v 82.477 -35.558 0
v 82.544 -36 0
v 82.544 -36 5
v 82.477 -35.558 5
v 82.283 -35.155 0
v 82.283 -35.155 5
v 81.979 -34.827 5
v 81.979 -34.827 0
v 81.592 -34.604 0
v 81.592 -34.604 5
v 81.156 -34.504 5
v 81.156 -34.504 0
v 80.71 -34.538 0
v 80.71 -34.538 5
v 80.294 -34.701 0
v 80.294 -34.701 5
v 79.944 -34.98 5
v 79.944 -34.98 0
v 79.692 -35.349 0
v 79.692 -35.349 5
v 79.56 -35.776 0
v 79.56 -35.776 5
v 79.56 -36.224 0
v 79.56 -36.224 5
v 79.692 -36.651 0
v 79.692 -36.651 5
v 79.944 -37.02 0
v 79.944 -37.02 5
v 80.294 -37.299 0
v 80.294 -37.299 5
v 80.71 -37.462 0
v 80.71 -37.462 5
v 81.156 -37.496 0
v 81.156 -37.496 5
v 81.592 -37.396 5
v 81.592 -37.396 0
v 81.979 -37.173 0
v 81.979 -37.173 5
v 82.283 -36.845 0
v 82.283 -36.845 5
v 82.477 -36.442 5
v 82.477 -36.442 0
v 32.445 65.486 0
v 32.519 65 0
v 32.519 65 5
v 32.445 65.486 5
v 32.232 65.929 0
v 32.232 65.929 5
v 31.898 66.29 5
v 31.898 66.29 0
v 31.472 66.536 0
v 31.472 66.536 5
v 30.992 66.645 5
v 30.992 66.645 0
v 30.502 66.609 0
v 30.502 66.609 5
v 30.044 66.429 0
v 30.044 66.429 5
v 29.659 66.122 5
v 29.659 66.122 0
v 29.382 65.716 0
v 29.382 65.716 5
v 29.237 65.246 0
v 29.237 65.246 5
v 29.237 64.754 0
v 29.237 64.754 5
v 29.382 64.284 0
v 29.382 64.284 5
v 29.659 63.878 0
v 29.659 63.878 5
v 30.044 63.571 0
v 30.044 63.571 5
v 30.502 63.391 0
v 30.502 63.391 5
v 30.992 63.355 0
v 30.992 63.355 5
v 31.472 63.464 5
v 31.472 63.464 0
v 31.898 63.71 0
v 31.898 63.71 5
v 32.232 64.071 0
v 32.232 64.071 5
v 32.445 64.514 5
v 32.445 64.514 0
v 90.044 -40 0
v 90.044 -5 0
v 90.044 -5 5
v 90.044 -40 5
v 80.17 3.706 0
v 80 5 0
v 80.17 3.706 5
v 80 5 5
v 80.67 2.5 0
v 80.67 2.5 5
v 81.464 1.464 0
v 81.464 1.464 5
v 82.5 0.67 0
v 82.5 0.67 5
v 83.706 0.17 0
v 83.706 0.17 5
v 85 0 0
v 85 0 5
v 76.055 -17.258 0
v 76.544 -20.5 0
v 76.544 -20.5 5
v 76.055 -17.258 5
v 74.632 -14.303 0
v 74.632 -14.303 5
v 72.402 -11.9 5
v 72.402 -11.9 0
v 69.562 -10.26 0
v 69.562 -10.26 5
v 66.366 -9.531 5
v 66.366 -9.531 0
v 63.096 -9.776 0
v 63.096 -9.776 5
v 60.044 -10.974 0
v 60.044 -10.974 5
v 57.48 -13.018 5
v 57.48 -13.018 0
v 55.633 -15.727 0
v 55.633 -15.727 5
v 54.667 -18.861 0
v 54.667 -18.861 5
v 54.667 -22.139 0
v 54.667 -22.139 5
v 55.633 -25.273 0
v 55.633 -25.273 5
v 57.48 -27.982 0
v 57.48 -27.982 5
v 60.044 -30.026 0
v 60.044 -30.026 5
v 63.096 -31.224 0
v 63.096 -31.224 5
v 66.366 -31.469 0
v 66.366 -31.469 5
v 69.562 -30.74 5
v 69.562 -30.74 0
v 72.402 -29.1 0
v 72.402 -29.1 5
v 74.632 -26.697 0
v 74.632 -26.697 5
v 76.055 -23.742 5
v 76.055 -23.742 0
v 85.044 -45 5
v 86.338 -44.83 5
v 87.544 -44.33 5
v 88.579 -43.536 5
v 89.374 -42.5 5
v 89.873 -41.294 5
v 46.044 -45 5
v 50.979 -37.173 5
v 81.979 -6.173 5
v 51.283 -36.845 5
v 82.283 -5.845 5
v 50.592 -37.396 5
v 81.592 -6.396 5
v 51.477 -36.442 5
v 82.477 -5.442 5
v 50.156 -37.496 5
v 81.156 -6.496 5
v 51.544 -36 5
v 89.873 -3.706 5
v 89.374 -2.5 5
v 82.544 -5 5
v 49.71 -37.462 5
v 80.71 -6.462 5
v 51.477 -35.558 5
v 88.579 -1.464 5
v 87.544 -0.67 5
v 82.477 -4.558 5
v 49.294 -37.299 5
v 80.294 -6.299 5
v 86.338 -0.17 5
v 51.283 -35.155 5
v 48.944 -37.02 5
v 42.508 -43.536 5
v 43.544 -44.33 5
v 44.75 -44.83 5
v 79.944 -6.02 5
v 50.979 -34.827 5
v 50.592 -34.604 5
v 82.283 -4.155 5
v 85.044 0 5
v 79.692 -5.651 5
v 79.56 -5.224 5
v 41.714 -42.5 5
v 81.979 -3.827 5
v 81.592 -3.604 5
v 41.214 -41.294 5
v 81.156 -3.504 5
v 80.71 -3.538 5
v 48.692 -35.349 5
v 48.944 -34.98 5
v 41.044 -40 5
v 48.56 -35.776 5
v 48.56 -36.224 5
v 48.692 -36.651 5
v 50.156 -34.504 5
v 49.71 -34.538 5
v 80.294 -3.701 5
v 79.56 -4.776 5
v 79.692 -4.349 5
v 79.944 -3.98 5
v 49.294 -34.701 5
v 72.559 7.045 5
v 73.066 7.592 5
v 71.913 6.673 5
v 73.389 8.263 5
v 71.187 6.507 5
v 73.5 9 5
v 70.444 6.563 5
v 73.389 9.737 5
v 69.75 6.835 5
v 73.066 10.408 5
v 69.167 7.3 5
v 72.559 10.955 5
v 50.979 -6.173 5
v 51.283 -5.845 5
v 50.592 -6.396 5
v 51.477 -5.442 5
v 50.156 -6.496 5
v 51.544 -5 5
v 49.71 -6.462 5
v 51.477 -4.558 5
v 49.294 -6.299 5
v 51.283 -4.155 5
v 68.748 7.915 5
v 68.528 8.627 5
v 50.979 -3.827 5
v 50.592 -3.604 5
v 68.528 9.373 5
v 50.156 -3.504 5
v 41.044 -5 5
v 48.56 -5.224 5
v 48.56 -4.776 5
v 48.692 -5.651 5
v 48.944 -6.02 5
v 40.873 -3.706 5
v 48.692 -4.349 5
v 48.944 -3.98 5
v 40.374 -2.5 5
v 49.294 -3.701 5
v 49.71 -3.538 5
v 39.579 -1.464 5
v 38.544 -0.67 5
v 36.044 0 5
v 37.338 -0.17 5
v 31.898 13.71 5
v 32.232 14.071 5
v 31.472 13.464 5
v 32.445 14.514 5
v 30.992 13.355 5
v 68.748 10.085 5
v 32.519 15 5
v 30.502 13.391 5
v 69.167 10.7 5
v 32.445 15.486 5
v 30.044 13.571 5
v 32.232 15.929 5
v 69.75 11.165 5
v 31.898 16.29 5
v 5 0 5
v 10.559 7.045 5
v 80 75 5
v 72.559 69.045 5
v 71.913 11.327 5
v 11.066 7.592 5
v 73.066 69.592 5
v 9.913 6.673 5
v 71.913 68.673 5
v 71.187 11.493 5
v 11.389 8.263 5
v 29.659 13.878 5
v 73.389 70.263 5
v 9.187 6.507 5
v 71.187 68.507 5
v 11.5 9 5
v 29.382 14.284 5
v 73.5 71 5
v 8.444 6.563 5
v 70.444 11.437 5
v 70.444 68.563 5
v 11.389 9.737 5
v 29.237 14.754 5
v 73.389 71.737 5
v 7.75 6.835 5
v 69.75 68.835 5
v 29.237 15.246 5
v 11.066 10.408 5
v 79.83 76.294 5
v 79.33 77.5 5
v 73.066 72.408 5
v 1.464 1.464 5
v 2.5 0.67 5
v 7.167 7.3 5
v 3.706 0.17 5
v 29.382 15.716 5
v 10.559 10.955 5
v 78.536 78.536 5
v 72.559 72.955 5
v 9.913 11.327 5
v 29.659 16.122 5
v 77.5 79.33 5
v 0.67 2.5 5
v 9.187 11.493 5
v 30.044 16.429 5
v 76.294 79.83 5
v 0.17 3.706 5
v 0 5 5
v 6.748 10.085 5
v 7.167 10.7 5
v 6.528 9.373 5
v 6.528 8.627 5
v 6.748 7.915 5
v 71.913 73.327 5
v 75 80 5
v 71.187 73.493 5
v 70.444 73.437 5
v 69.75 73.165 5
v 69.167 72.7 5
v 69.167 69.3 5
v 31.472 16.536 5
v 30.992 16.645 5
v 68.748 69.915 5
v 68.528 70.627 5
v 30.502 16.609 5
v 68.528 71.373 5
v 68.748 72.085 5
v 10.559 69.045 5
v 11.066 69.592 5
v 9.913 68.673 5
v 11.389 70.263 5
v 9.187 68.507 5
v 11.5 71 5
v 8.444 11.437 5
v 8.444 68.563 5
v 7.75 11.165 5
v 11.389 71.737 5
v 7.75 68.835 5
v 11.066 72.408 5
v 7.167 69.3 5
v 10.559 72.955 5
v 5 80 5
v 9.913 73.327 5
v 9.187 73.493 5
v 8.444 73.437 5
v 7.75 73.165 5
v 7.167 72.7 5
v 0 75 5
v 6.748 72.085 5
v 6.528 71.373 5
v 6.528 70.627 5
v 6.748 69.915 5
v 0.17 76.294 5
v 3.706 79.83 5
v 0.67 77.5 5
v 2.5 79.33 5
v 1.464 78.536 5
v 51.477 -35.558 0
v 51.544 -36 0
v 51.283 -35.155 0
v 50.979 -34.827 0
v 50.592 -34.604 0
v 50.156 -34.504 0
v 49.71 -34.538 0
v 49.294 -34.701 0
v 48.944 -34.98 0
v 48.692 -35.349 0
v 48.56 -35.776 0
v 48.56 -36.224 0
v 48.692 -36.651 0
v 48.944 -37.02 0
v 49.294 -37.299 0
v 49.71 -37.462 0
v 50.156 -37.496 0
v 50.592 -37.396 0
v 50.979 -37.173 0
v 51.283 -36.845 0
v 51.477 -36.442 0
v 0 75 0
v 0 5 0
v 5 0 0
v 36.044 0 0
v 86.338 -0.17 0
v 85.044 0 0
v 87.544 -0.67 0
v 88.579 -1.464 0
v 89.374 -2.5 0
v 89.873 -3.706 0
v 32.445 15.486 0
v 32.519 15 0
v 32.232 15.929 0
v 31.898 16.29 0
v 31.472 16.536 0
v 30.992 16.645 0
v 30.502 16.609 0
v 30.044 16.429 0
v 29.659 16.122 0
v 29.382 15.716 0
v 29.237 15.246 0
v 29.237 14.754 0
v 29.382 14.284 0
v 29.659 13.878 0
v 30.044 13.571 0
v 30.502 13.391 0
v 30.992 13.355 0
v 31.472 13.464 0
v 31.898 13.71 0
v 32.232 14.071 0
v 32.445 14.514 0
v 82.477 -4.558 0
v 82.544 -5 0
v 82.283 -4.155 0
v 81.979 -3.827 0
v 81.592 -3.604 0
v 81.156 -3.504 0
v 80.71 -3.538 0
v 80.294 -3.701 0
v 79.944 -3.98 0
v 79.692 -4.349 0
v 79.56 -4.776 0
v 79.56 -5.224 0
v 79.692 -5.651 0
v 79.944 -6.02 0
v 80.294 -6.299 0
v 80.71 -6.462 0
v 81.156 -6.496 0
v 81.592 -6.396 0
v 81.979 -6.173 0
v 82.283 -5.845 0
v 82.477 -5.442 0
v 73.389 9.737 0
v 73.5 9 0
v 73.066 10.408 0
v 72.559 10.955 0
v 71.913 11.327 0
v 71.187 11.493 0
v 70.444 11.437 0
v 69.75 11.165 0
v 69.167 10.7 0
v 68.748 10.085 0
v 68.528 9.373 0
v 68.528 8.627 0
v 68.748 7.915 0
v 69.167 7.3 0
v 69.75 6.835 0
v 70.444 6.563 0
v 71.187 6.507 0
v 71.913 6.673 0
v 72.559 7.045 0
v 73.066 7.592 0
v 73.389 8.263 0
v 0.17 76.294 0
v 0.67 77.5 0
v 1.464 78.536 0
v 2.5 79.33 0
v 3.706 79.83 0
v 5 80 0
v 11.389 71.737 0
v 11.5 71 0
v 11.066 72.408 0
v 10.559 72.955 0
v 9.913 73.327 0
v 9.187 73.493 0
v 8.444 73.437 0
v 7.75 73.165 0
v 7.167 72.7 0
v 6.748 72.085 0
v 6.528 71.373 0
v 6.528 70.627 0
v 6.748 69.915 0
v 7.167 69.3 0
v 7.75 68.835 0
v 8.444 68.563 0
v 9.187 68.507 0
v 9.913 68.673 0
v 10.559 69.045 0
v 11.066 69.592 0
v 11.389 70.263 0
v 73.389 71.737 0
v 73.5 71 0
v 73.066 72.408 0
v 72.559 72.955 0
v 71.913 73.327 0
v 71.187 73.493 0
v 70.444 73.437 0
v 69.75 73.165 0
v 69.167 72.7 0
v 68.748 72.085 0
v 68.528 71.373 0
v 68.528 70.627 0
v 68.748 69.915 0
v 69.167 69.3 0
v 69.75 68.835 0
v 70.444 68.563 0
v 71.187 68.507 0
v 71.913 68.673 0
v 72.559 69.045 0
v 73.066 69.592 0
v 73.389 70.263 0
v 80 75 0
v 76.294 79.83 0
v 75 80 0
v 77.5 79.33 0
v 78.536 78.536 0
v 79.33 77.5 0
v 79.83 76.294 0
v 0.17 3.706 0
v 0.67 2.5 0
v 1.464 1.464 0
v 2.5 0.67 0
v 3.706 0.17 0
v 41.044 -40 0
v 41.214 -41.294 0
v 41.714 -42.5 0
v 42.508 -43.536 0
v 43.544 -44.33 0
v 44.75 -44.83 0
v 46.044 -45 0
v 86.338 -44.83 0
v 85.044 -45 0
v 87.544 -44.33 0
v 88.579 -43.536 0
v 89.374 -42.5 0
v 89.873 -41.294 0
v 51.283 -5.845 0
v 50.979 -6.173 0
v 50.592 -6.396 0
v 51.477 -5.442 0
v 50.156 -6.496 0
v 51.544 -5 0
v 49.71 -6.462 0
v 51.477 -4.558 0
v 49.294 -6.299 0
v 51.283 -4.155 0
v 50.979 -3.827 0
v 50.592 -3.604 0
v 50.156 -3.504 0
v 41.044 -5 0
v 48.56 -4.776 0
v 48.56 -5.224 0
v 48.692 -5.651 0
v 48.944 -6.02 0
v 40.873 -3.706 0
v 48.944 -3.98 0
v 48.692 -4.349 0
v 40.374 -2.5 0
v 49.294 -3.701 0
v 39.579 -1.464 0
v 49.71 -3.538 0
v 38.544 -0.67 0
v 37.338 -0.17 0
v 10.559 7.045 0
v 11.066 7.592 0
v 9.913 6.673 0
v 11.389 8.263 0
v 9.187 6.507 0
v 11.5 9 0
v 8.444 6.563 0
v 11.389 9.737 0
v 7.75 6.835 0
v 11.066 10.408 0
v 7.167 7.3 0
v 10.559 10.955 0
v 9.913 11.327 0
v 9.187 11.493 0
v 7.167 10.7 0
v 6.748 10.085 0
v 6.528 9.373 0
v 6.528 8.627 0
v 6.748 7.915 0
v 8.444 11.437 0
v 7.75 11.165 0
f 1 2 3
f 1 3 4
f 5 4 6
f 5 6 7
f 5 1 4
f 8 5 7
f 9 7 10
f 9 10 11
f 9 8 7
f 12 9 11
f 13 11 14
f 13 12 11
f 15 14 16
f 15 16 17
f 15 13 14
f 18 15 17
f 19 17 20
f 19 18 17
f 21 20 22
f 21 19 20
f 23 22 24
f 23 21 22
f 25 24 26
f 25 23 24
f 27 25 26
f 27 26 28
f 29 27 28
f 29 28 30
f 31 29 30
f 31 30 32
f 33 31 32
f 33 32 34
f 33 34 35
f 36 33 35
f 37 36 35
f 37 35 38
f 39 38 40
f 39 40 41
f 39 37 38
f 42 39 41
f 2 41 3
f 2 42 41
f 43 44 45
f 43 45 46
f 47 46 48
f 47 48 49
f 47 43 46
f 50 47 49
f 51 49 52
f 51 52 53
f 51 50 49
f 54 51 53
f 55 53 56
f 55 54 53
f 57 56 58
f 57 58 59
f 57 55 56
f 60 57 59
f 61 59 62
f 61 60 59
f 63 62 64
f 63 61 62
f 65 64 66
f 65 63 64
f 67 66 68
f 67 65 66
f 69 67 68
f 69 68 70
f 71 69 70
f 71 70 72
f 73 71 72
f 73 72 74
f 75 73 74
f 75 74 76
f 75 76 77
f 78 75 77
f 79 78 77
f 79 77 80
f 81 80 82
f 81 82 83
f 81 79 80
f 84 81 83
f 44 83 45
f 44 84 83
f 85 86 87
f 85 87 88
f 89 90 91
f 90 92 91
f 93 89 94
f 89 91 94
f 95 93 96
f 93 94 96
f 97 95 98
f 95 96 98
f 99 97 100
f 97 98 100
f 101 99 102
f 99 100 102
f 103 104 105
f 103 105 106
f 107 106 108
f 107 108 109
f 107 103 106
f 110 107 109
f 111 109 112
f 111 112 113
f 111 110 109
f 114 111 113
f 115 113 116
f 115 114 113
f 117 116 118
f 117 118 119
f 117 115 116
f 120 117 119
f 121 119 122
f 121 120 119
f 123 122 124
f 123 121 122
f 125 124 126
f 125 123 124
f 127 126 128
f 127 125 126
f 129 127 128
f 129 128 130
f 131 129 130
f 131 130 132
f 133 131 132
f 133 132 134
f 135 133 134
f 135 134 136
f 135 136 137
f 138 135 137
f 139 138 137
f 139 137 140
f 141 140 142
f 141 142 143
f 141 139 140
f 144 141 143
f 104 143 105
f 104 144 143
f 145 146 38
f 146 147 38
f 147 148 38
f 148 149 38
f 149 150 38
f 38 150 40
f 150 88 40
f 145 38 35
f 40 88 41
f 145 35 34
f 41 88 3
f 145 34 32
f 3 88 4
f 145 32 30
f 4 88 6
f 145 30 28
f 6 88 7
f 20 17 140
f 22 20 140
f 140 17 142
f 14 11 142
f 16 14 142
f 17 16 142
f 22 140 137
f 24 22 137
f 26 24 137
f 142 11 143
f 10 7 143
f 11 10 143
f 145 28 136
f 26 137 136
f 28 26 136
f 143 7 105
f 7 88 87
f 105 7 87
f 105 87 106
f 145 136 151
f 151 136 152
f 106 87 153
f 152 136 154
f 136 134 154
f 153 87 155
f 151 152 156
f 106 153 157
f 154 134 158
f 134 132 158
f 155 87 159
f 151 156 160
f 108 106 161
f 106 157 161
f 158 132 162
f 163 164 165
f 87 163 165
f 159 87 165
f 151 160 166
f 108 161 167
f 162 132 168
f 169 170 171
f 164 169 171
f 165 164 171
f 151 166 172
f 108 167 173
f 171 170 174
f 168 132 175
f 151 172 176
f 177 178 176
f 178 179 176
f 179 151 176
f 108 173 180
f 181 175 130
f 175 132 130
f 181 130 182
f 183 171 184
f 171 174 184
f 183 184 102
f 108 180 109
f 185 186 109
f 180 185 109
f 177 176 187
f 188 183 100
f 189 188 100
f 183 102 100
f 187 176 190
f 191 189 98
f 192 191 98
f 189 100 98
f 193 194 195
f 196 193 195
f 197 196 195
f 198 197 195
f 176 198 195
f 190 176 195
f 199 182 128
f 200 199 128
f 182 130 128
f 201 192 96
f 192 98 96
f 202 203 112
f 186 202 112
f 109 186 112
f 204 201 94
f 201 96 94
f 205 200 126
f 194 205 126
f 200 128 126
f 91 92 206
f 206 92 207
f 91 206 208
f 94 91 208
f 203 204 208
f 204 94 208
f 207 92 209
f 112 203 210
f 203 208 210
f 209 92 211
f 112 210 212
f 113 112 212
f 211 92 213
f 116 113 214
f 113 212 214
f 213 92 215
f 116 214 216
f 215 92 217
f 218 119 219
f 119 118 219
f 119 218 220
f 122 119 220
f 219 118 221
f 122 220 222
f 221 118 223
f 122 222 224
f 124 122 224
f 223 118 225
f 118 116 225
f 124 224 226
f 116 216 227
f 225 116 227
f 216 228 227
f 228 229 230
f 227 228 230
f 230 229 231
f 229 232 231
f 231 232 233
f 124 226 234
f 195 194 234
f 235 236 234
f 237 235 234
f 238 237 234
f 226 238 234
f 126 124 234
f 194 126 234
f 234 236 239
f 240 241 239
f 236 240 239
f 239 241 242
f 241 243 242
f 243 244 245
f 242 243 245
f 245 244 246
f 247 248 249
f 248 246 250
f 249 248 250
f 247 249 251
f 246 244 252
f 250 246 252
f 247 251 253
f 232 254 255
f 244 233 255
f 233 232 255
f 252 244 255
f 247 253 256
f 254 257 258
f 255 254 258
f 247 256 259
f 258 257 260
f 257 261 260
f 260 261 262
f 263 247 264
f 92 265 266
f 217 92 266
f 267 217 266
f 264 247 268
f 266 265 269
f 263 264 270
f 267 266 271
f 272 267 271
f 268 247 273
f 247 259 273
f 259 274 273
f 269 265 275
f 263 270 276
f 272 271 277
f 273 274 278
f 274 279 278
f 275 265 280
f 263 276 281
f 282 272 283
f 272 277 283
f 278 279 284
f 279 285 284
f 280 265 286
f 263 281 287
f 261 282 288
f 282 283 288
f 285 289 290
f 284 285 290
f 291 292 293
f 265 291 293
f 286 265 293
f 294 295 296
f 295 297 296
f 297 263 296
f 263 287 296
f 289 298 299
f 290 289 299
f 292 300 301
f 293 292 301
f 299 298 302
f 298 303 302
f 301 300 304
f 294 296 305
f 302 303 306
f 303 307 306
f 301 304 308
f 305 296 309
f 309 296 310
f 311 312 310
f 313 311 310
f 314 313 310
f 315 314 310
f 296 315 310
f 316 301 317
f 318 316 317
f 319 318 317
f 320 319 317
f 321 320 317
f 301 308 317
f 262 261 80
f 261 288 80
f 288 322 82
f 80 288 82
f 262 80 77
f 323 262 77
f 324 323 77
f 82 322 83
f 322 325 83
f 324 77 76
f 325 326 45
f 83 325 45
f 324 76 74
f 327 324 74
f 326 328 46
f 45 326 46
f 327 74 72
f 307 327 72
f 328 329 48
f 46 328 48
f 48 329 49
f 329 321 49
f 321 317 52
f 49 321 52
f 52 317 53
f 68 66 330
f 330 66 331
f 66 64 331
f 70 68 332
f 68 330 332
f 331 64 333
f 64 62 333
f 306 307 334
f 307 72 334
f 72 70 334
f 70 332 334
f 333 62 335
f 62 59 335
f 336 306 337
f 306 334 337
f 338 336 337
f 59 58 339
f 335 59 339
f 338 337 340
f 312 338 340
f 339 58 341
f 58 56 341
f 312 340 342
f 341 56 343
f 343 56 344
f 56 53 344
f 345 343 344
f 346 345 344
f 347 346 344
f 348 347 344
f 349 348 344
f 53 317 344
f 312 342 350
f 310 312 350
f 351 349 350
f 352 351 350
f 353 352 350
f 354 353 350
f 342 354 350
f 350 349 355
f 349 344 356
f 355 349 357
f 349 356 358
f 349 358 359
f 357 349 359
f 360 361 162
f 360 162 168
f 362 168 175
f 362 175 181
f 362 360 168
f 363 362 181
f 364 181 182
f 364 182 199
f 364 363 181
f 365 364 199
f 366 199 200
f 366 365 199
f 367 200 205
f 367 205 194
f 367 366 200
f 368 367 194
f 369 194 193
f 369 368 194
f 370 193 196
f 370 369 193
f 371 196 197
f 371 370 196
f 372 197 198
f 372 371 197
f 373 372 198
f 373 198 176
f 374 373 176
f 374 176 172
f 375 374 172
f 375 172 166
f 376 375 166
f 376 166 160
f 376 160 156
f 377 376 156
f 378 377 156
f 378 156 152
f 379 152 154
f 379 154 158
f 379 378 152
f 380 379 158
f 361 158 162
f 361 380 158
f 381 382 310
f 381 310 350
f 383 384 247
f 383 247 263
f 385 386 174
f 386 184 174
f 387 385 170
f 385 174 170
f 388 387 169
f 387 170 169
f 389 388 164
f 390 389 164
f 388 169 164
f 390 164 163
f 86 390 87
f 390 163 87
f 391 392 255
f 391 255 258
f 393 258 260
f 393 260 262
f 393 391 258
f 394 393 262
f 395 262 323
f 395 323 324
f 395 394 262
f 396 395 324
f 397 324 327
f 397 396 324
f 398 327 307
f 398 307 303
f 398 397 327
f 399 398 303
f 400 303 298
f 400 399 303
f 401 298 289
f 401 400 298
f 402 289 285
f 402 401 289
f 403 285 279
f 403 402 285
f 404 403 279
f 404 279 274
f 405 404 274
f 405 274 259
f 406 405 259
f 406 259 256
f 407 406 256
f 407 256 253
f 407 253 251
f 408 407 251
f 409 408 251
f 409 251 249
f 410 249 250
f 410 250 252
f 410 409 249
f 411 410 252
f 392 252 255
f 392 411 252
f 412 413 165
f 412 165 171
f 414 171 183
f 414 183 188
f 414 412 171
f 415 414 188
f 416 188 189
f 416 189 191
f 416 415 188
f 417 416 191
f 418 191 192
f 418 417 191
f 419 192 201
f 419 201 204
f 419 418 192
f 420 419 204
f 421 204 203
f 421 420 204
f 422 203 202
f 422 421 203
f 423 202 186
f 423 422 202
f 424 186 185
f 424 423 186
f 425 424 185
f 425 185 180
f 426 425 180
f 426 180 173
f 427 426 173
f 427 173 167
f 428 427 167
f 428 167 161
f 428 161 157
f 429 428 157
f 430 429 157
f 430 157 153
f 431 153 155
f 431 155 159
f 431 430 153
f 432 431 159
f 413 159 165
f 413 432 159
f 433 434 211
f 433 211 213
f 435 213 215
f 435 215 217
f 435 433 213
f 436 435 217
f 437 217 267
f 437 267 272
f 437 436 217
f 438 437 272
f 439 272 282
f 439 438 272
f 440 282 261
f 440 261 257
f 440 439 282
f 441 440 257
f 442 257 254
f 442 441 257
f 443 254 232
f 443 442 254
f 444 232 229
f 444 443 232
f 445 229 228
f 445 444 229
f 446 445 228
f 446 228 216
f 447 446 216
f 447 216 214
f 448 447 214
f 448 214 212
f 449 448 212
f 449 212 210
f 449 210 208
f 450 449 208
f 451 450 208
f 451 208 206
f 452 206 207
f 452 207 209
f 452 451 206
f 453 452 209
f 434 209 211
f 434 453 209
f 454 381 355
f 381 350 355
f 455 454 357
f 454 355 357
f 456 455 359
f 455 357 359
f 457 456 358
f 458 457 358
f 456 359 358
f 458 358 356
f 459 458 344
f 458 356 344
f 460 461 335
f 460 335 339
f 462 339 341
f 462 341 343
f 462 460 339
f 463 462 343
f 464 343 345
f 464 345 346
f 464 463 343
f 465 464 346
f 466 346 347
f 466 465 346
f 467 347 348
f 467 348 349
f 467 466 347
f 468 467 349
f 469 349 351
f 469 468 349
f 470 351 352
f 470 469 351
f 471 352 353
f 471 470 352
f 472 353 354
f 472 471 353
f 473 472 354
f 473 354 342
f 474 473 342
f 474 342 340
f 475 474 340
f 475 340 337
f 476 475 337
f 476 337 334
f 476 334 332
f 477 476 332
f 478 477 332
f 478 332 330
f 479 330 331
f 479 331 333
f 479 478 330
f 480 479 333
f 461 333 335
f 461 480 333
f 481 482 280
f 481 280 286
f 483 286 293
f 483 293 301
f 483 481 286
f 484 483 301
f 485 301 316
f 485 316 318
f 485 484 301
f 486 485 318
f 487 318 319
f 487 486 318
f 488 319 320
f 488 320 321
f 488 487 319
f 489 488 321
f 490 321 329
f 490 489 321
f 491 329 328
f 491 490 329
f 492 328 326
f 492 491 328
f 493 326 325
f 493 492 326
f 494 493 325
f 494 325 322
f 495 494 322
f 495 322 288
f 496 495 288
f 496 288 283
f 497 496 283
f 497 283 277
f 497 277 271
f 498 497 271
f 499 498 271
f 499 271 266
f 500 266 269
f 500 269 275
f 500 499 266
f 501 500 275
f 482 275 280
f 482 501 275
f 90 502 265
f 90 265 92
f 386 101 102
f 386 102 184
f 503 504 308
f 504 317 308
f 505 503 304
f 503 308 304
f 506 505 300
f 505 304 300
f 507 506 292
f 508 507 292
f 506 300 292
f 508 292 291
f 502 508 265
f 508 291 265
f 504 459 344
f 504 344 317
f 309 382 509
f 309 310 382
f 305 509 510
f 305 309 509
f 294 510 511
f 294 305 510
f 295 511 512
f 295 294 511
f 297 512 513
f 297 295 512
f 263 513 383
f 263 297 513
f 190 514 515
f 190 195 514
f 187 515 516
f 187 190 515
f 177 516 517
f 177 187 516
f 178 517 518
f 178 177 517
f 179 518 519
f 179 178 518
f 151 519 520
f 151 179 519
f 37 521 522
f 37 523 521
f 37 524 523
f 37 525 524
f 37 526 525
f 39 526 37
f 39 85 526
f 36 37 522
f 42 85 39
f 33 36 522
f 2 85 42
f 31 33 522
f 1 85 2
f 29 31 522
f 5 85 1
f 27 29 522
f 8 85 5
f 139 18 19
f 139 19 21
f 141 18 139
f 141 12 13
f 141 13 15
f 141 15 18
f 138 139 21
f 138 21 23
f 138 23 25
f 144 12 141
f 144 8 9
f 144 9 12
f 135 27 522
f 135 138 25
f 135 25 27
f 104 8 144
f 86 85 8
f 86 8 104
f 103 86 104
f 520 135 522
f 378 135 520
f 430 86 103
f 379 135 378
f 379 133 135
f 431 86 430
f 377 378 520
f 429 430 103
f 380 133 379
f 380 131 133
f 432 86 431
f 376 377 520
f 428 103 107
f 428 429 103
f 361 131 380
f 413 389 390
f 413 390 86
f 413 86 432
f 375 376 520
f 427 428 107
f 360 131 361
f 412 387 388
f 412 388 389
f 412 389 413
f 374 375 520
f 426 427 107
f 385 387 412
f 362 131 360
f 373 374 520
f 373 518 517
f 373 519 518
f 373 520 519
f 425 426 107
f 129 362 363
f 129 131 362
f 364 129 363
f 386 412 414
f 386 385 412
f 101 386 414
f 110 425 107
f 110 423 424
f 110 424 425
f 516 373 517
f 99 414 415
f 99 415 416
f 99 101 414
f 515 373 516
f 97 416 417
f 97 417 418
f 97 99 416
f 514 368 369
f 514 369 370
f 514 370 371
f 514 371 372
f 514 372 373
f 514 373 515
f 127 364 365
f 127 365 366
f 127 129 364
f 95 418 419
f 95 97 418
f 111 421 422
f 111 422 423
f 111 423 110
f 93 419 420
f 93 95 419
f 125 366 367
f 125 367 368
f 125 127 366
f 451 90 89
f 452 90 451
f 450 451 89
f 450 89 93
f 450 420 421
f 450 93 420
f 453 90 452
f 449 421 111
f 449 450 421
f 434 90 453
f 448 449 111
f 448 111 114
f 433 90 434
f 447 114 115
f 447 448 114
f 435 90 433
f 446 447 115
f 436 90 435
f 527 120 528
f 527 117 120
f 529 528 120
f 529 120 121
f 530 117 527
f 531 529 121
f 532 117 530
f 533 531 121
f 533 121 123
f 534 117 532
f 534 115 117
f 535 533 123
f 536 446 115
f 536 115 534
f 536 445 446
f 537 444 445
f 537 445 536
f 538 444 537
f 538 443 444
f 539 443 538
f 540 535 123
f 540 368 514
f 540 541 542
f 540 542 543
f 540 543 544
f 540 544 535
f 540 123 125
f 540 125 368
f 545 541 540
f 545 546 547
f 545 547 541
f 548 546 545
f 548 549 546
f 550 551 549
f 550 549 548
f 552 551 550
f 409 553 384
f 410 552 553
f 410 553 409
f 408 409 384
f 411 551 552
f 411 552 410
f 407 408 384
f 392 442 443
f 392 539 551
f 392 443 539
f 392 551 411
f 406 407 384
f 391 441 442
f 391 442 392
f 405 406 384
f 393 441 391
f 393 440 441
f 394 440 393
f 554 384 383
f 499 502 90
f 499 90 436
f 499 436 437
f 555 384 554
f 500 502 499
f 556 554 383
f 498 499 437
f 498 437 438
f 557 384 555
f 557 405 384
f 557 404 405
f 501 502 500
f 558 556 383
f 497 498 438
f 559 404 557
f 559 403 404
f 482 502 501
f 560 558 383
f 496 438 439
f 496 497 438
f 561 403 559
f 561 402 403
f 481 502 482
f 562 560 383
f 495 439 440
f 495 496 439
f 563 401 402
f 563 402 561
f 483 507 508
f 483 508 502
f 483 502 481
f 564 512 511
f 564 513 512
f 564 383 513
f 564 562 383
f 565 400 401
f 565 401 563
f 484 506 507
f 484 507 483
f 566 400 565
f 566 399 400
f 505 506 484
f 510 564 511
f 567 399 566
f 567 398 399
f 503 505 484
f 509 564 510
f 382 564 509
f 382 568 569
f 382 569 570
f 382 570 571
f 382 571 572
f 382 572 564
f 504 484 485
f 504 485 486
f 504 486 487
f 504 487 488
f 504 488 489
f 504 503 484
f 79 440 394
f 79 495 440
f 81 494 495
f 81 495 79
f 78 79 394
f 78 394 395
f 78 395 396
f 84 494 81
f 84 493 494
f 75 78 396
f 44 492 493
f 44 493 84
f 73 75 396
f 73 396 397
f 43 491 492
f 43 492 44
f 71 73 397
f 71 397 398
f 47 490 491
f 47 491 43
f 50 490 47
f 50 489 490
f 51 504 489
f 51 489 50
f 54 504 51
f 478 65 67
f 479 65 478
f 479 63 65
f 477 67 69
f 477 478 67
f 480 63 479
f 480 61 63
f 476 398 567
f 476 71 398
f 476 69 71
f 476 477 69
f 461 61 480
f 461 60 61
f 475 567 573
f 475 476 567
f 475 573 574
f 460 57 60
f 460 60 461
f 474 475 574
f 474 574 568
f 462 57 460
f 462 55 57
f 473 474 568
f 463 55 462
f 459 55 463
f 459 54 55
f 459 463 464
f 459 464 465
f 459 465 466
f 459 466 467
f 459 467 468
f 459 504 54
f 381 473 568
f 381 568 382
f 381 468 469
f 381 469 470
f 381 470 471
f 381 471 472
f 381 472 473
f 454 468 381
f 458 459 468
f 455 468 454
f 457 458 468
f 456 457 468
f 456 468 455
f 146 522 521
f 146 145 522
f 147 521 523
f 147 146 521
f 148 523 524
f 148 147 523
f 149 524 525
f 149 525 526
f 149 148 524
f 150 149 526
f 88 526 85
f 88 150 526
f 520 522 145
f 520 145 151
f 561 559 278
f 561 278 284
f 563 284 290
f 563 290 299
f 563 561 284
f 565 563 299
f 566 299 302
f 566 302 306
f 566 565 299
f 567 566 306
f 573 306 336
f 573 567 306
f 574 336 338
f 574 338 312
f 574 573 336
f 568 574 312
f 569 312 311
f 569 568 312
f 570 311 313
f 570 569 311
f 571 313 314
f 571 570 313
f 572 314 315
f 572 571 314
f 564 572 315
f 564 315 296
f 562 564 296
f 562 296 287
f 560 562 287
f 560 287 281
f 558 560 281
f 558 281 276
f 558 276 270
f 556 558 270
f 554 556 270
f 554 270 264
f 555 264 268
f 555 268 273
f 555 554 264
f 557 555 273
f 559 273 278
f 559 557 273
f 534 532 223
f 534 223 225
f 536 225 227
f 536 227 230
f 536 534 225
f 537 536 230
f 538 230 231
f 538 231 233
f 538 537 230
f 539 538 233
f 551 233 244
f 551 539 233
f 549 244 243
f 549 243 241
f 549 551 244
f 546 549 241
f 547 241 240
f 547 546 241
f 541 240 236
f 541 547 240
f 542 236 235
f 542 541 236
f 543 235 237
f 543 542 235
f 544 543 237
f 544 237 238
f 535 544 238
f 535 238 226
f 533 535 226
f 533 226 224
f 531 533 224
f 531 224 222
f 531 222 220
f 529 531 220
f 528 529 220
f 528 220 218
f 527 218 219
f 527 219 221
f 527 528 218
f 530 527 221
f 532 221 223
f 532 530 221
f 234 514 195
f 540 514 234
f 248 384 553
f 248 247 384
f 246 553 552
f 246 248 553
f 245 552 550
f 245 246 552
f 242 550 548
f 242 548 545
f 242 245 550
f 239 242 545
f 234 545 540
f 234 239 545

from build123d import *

# Parameters (mm, degrees)
SKETCH1_R           = 2.5
SKETCH1_R_2         = 1.5
SKETCH1_R_3         = 11
SKETCH1_R_4         = 1.65
BOSS_EXTRUDE1_DEPTH = 5
FILLET1_R           = 5


with BuildPart() as part:
    # Sketch1 → Boss-Extrude1 (new body)
    with BuildSketch(Plane.XY):
        Polygon((0, 0), (0, 80), (80, 80), (80, 0), (90.043707679, 0), (90.043707679, -45), (41.043707679, -45), (41.043707679, 0), align=None)
        with Locations((9, 71)):
            Circle(SKETCH1_R, mode=Mode.SUBTRACT)
        with Locations((71, 71)):
            Circle(SKETCH1_R, mode=Mode.SUBTRACT)
        with Locations((71, 9)):
            Circle(SKETCH1_R, mode=Mode.SUBTRACT)
        with Locations((9, 9)):
            Circle(SKETCH1_R, mode=Mode.SUBTRACT)
        with Locations((50.043707679, -5)):
            Circle(SKETCH1_R_2, mode=Mode.SUBTRACT)
        with Locations((81.043707679, -5)):
            Circle(SKETCH1_R_2, mode=Mode.SUBTRACT)
        with Locations((50.043707679, -36)):
            Circle(SKETCH1_R_2, mode=Mode.SUBTRACT)
        with Locations((81.043707679, -36)):
            Circle(SKETCH1_R_2, mode=Mode.SUBTRACT)
        with Locations((65.543707679, -20.5)):
            Circle(SKETCH1_R_3, mode=Mode.SUBTRACT)
        with Locations((30.868801214, 15)):
            Circle(SKETCH1_R_4, mode=Mode.SUBTRACT)
        with Locations((30.868801214, 65)):
            Circle(SKETCH1_R_4, mode=Mode.SUBTRACT)
    extrude(amount=BOSS_EXTRUDE1_DEPTH)

    # Fillet1
    fillet1_edges = [part.edges().sort_by_distance(p)[0] for p in [
        (0, 0, 2.5),
        (0, 80, 2.5),
        (80, 80, 2.5),
        (80, 0, 2.5),
        (90.043707679, 0, 2.5),
        (90.043707679, -45, 2.5),
        (41.043707679, -45, 2.5),
        (41.043707679, 0, 2.5),
    ]]
    fillet(fillet1_edges, radius=FILLET1_R)


solid = part.part
